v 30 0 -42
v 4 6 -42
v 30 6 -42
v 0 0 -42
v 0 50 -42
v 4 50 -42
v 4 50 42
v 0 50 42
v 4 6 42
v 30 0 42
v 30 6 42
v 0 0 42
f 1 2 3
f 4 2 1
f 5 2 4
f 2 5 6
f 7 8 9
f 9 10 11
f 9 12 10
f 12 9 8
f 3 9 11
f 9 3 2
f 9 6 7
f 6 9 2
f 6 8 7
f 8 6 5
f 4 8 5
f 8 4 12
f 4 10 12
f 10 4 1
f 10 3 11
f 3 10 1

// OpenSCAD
// 8-tube PCR strip holder that hooks over a 12 mm bucket wall
// Printed as used: rests on XY plane (z=0), builds up +Z, centred on x=0.

$fn = 64;

// ---- Wall / hook dimensions (YZ profile) ----
wall_thick   = 12;    // bucket wall thickness (gap the hook spans)
leg_thick    = 4;     // thickness of each hook leg
hook_height  = 50;    // z=0..50 for both legs
bridge_thick = 4;     // z=46..50 top bridge
// inner leg  : y = 0 .. 4
// outer leg  : y = 16.5 .. 20.5  (gap 4..16.5 = 12.5 mm, clears 12 mm wall)

// ---- Ledge (tube platform) dimensions ----
ledge_thick  = 6;     // z=0..6
ledge_len    = 30;    // reaches y=0 .. y=-30 into the ice

// ---- Tube holes ----
n_tubes      = 8;
hole_diam    = 6.4;   // through-hole diameter
hole_pitch   = 9;     // spacing along X
hole_y       = -15;   // hole centre in Y

// ---- Extrusion ----
extrude_len  = 84;    // extruded along X, centred on x=0

// ---- Build the YZ profile (x=0 plane) and extrude along X ----
module profile() {
    linear_extrude(extrude_len, center = true) {
        // inner leg
        square([leg_thick, hook_height], start = [0, 0]);
        // outer leg
        square([leg_thick, hook_height], start = [wall_thick + 0.5, 0]);
        // top bridge joining the legs
        square([wall_thick + 0.5 + leg_thick, bridge_thick], start = [0, hook_height - bridge_thick]);
        // flat ledge extending toward -Y from the inner-leg foot
        square([ledge_len, ledge_thick], start = [-ledge_len, 0]);
    }
}

// ---- Tube holes (through the ledge, along Z) ----
module holes() {
    for (i = [0 : n_tubes - 1]) {
        x = (i - (n_tubes - 1) / 2) * hole_pitch;   // centred on x=0
        translate([x, hole_y, -1]) {
            cylinder(h = ledge_thick + 2, r = hole_diam / 2, $fn = $fn);
        }
    }
}

// ---- Final solid: profile minus holes ----
difference() {
    profile();
    holes();
}
